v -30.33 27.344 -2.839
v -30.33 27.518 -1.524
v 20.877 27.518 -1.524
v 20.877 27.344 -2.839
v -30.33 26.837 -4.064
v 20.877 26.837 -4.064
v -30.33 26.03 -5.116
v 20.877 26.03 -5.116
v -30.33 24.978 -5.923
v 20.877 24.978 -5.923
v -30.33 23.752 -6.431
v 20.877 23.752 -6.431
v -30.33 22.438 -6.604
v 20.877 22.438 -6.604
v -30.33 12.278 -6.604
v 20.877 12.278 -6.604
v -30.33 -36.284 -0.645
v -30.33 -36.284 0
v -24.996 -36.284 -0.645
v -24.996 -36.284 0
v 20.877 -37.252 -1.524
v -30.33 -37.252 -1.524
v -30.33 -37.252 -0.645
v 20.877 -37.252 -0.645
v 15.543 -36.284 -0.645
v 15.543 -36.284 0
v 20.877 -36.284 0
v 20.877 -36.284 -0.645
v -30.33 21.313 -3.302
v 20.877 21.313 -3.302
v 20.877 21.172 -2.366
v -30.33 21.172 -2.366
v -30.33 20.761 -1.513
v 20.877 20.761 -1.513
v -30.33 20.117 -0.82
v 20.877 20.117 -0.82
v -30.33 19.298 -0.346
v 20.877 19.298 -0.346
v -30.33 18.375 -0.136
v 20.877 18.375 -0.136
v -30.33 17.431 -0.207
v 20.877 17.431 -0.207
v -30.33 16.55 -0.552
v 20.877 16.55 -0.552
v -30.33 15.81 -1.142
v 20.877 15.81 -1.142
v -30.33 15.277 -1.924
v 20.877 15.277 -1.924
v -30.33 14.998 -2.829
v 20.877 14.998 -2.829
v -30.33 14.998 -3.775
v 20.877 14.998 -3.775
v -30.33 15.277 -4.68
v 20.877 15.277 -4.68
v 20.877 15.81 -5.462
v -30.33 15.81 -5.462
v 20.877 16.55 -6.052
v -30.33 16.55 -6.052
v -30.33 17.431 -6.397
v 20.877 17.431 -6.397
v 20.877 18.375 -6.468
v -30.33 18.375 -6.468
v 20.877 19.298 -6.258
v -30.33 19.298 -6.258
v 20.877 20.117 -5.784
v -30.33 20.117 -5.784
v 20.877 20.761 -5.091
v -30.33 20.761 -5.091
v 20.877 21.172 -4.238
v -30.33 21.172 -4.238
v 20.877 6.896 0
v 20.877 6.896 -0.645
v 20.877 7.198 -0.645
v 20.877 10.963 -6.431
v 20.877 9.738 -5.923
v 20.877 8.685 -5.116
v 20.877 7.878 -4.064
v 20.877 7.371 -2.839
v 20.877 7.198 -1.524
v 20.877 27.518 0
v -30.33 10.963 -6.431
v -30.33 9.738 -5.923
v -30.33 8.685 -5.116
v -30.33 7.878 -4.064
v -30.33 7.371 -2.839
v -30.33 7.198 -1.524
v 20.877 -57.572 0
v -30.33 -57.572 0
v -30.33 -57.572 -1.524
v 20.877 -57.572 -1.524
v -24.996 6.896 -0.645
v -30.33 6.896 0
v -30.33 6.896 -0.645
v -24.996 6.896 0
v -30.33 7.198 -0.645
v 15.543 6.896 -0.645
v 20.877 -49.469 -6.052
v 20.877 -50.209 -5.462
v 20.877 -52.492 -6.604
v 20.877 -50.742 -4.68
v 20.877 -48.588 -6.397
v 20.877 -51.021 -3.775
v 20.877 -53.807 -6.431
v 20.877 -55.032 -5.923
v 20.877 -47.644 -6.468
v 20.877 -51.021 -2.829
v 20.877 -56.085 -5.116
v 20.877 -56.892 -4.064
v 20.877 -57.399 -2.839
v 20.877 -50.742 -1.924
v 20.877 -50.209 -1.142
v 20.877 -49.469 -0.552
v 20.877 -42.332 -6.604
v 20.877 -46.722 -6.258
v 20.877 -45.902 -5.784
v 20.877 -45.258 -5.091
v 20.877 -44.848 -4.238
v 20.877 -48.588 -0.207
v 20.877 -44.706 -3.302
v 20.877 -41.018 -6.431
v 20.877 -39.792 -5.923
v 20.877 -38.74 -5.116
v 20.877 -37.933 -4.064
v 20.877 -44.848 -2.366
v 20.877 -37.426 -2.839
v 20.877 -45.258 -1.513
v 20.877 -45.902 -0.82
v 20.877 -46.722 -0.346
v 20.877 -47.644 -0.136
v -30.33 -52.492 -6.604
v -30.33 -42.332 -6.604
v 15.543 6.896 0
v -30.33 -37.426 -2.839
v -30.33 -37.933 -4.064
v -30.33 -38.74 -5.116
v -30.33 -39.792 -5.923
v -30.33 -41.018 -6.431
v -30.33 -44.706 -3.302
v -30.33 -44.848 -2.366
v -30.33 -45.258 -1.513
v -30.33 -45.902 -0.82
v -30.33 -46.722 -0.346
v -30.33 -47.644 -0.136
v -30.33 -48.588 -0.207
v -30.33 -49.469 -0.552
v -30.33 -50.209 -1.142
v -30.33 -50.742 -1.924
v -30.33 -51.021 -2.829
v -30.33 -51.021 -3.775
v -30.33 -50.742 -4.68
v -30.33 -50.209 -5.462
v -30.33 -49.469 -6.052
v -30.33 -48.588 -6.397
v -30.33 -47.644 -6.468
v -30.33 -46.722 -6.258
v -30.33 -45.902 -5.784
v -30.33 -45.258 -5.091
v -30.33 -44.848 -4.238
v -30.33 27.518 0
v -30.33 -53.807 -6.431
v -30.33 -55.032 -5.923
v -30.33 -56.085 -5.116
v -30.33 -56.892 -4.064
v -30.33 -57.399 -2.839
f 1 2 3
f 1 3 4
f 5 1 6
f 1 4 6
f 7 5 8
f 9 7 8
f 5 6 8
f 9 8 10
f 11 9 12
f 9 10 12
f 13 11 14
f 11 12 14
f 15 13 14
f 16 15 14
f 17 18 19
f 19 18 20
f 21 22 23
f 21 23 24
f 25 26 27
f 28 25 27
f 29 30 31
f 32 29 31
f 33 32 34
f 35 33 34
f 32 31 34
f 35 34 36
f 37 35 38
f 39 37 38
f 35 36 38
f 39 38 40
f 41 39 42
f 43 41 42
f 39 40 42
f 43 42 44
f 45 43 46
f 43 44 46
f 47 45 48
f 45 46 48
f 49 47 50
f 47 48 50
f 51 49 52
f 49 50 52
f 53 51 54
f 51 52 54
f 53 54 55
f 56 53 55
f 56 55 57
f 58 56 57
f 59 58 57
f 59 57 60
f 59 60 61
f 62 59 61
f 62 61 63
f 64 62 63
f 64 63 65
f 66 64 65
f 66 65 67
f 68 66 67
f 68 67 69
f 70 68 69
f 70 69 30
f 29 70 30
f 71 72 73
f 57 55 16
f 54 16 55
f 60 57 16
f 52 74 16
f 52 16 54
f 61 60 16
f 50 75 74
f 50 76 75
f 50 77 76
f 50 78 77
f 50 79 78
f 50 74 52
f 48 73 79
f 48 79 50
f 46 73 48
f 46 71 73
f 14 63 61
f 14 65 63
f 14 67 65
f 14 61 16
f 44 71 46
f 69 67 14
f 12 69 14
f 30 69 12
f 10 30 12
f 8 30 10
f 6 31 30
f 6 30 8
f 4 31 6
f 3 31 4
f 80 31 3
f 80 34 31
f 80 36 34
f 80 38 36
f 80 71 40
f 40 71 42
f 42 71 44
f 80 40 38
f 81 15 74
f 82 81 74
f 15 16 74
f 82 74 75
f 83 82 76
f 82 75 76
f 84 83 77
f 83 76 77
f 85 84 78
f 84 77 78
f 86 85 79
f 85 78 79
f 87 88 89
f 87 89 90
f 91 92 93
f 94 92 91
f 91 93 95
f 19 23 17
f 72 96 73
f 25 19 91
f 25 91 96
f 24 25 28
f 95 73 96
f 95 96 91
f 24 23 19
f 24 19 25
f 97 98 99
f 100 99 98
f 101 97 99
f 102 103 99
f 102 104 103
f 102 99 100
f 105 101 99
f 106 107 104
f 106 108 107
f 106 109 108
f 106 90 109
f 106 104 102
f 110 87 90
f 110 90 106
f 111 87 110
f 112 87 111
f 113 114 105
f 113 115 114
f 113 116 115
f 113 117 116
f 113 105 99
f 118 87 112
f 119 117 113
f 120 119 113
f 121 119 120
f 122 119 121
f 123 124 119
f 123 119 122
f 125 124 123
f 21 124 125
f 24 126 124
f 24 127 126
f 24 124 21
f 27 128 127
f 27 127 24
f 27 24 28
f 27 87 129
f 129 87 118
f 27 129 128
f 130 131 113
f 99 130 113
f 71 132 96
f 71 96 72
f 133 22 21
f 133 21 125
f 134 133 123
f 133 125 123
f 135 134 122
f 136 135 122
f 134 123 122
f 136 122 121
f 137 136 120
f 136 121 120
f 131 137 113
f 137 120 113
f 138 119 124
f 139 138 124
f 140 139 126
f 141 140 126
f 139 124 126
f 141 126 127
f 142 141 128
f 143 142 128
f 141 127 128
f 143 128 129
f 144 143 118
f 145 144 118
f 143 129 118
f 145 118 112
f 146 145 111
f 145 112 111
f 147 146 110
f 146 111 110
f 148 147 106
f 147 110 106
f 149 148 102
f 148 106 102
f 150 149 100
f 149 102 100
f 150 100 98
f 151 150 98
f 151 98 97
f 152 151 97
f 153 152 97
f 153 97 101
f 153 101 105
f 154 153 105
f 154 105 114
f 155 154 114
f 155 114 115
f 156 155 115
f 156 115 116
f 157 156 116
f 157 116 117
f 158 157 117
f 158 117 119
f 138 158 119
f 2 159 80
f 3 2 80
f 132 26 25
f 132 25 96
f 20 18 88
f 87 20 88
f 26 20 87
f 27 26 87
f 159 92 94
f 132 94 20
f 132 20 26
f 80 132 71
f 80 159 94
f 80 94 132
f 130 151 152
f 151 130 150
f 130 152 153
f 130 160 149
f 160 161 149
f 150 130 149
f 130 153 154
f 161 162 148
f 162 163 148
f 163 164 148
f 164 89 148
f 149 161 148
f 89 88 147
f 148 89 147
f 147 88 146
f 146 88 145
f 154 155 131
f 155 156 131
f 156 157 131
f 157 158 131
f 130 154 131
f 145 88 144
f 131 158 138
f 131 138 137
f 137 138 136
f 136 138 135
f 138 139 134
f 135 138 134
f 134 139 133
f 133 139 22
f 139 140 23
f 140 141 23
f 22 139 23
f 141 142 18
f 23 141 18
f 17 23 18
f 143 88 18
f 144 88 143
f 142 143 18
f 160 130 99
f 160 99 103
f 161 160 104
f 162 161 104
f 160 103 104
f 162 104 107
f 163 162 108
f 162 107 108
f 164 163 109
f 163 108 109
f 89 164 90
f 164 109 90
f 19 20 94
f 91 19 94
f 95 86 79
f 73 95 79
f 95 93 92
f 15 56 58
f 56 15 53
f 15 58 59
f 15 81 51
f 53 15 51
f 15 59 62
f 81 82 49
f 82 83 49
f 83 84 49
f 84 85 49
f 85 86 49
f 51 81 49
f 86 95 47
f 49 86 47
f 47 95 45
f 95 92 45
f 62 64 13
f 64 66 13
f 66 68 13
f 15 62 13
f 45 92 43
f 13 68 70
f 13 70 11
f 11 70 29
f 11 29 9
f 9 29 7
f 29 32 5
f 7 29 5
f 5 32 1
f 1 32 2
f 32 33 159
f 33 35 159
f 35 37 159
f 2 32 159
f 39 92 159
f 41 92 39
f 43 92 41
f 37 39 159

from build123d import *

# Parameters (mm, degrees)
F0_W     = 51.2064
F0_H     = 85.09
F1_DEPTH = 6.604
F2_R     = 3.175
F3_DEPTH = 95.21702
F4_W     = 51.2064
F4_H     = 44.45
F5_DEPTH = 5.95932
F6_R     = 5.08
F7_W     = 5.334
F7_H     = 43.18
F8_DEPTH = 25.4


with BuildPart() as f1:
    # F0 (on Top) → F1 (new body)
    with BuildSketch(Plane.XY):
        with Locations((-4.726471, -15.027478)):
            Rectangle(F0_W, F0_H)
    extrude(amount=-F1_DEPTH)

    # F2 (on face) → F3 (cut)
    with BuildSketch(Plane.YZ.offset(20.876729)):
        with Locations((18.137634, -3.302)):
            Circle(F2_R)
        with Locations((-47.881499, -3.302)):
            Circle(F2_R)
    extrude(amount=-F3_DEPTH, mode=Mode.SUBTRACT)

    # F4 (on face) → F5 (cut)
    with BuildSketch(Plane(origin=(0, 0, -6.604), x_dir=(1, 0, 0), z_dir=(0, 0, -1))):
        with Locations((-4.726471, 15.027478)):
            Rectangle(F4_W, F4_H)
    extrude(amount=-F5_DEPTH, mode=Mode.SUBTRACT)

    # F6
    f6_edges = [f1.edges().sort_by_distance(p)[0] for p in [
        (-4.726471, -37.252478, -6.604),
        (-4.726471, -57.572478, -6.604),
        (-4.726471, 7.197522, -6.604),
        (-4.726471, 27.517522, -6.604),
    ]]
    fillet(f6_edges, radius=F6_R)

    # F7 (on face) → F8 (cut)
    with BuildSketch(Plane.XY):
        with Locations((-27.662671, -14.693605)):
            Rectangle(F7_W, F7_H)
        with Locations((18.209729, -14.693605)):
            Rectangle(F7_W, F7_H)
    extrude(amount=-F8_DEPTH, mode=Mode.SUBTRACT)


solid = f1.part
